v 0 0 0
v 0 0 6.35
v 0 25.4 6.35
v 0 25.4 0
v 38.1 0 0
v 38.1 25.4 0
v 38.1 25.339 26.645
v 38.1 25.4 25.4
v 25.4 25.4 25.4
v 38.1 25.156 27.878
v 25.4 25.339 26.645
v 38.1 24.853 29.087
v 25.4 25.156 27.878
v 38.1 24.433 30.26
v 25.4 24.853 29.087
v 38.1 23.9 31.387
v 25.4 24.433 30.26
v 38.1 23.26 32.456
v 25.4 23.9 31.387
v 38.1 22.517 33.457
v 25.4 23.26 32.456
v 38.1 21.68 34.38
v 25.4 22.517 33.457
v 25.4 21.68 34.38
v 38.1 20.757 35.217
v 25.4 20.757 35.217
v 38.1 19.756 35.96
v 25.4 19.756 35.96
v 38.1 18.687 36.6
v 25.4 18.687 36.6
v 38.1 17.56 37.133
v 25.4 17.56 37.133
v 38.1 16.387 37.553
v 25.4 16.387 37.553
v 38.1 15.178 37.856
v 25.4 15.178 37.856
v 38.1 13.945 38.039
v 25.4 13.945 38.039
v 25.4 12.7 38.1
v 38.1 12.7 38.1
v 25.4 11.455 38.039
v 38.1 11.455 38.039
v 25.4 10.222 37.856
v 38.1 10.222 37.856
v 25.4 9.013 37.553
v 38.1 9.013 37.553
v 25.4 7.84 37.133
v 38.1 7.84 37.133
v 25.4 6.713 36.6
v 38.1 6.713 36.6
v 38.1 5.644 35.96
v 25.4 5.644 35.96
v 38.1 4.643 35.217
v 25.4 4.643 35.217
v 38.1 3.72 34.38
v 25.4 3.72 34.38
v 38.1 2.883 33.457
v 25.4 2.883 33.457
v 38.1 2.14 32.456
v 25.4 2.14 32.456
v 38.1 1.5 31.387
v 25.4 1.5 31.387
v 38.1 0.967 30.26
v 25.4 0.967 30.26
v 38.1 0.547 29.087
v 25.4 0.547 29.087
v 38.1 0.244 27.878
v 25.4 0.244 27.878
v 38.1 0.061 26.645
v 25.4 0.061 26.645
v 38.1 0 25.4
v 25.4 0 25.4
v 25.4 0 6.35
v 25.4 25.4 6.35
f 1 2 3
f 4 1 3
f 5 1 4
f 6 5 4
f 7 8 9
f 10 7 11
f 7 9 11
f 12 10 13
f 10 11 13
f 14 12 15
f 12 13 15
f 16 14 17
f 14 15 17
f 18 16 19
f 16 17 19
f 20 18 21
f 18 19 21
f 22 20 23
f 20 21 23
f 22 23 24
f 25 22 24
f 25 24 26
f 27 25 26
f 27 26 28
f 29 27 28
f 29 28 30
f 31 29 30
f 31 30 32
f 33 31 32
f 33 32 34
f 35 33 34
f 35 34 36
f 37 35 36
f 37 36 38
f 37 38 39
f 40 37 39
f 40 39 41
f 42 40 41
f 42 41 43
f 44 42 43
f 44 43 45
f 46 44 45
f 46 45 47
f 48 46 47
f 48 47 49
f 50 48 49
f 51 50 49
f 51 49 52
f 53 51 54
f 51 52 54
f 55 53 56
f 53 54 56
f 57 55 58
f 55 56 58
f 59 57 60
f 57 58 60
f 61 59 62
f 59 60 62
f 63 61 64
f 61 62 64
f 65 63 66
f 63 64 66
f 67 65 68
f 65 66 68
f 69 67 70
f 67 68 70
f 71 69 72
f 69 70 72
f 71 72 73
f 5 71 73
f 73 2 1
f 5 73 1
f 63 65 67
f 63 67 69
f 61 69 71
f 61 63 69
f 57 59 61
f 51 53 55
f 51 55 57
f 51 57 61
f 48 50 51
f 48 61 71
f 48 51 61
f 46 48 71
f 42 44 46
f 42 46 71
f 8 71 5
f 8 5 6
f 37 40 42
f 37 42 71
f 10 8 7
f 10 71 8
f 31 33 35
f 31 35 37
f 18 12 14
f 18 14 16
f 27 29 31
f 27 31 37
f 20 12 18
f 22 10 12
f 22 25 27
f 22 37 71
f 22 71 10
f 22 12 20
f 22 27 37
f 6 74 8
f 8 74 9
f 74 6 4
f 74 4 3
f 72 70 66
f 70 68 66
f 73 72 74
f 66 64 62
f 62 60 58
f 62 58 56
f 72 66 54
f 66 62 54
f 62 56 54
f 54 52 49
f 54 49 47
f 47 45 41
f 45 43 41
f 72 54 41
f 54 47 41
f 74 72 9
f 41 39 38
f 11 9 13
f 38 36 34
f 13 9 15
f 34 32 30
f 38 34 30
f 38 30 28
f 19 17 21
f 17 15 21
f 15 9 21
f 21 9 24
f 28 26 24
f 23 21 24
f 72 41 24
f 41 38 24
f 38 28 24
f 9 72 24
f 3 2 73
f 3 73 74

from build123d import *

# Parameters (mm, degrees)
F1_DEPTH = 38.1
F2_W     = 106.504818
F2_H     = 101.6
F3_DEPTH = 25.4


with BuildPart() as f1:
    # F0 (on Right) → F1 (new body)
    with BuildSketch(Plane.YZ):
        with BuildLine():
            Line((0, 25.4), (0, 0))
            Line((0, 0), (25.4, 0))
            Line((25.4, 0), (25.4, 25.4))
            ThreePointArc((25.4, 25.4), (12.7, 38.1), (0, 25.4))
        make_face()
    extrude(amount=F1_DEPTH)

    # F2 (on Right) → F3 (cut)
    with BuildSketch(Plane.YZ):
        with Locations((53.252409, 57.15)):
            Rectangle(F2_W, F2_H)
    extrude(amount=F3_DEPTH, mode=Mode.SUBTRACT)


solid = f1.part
